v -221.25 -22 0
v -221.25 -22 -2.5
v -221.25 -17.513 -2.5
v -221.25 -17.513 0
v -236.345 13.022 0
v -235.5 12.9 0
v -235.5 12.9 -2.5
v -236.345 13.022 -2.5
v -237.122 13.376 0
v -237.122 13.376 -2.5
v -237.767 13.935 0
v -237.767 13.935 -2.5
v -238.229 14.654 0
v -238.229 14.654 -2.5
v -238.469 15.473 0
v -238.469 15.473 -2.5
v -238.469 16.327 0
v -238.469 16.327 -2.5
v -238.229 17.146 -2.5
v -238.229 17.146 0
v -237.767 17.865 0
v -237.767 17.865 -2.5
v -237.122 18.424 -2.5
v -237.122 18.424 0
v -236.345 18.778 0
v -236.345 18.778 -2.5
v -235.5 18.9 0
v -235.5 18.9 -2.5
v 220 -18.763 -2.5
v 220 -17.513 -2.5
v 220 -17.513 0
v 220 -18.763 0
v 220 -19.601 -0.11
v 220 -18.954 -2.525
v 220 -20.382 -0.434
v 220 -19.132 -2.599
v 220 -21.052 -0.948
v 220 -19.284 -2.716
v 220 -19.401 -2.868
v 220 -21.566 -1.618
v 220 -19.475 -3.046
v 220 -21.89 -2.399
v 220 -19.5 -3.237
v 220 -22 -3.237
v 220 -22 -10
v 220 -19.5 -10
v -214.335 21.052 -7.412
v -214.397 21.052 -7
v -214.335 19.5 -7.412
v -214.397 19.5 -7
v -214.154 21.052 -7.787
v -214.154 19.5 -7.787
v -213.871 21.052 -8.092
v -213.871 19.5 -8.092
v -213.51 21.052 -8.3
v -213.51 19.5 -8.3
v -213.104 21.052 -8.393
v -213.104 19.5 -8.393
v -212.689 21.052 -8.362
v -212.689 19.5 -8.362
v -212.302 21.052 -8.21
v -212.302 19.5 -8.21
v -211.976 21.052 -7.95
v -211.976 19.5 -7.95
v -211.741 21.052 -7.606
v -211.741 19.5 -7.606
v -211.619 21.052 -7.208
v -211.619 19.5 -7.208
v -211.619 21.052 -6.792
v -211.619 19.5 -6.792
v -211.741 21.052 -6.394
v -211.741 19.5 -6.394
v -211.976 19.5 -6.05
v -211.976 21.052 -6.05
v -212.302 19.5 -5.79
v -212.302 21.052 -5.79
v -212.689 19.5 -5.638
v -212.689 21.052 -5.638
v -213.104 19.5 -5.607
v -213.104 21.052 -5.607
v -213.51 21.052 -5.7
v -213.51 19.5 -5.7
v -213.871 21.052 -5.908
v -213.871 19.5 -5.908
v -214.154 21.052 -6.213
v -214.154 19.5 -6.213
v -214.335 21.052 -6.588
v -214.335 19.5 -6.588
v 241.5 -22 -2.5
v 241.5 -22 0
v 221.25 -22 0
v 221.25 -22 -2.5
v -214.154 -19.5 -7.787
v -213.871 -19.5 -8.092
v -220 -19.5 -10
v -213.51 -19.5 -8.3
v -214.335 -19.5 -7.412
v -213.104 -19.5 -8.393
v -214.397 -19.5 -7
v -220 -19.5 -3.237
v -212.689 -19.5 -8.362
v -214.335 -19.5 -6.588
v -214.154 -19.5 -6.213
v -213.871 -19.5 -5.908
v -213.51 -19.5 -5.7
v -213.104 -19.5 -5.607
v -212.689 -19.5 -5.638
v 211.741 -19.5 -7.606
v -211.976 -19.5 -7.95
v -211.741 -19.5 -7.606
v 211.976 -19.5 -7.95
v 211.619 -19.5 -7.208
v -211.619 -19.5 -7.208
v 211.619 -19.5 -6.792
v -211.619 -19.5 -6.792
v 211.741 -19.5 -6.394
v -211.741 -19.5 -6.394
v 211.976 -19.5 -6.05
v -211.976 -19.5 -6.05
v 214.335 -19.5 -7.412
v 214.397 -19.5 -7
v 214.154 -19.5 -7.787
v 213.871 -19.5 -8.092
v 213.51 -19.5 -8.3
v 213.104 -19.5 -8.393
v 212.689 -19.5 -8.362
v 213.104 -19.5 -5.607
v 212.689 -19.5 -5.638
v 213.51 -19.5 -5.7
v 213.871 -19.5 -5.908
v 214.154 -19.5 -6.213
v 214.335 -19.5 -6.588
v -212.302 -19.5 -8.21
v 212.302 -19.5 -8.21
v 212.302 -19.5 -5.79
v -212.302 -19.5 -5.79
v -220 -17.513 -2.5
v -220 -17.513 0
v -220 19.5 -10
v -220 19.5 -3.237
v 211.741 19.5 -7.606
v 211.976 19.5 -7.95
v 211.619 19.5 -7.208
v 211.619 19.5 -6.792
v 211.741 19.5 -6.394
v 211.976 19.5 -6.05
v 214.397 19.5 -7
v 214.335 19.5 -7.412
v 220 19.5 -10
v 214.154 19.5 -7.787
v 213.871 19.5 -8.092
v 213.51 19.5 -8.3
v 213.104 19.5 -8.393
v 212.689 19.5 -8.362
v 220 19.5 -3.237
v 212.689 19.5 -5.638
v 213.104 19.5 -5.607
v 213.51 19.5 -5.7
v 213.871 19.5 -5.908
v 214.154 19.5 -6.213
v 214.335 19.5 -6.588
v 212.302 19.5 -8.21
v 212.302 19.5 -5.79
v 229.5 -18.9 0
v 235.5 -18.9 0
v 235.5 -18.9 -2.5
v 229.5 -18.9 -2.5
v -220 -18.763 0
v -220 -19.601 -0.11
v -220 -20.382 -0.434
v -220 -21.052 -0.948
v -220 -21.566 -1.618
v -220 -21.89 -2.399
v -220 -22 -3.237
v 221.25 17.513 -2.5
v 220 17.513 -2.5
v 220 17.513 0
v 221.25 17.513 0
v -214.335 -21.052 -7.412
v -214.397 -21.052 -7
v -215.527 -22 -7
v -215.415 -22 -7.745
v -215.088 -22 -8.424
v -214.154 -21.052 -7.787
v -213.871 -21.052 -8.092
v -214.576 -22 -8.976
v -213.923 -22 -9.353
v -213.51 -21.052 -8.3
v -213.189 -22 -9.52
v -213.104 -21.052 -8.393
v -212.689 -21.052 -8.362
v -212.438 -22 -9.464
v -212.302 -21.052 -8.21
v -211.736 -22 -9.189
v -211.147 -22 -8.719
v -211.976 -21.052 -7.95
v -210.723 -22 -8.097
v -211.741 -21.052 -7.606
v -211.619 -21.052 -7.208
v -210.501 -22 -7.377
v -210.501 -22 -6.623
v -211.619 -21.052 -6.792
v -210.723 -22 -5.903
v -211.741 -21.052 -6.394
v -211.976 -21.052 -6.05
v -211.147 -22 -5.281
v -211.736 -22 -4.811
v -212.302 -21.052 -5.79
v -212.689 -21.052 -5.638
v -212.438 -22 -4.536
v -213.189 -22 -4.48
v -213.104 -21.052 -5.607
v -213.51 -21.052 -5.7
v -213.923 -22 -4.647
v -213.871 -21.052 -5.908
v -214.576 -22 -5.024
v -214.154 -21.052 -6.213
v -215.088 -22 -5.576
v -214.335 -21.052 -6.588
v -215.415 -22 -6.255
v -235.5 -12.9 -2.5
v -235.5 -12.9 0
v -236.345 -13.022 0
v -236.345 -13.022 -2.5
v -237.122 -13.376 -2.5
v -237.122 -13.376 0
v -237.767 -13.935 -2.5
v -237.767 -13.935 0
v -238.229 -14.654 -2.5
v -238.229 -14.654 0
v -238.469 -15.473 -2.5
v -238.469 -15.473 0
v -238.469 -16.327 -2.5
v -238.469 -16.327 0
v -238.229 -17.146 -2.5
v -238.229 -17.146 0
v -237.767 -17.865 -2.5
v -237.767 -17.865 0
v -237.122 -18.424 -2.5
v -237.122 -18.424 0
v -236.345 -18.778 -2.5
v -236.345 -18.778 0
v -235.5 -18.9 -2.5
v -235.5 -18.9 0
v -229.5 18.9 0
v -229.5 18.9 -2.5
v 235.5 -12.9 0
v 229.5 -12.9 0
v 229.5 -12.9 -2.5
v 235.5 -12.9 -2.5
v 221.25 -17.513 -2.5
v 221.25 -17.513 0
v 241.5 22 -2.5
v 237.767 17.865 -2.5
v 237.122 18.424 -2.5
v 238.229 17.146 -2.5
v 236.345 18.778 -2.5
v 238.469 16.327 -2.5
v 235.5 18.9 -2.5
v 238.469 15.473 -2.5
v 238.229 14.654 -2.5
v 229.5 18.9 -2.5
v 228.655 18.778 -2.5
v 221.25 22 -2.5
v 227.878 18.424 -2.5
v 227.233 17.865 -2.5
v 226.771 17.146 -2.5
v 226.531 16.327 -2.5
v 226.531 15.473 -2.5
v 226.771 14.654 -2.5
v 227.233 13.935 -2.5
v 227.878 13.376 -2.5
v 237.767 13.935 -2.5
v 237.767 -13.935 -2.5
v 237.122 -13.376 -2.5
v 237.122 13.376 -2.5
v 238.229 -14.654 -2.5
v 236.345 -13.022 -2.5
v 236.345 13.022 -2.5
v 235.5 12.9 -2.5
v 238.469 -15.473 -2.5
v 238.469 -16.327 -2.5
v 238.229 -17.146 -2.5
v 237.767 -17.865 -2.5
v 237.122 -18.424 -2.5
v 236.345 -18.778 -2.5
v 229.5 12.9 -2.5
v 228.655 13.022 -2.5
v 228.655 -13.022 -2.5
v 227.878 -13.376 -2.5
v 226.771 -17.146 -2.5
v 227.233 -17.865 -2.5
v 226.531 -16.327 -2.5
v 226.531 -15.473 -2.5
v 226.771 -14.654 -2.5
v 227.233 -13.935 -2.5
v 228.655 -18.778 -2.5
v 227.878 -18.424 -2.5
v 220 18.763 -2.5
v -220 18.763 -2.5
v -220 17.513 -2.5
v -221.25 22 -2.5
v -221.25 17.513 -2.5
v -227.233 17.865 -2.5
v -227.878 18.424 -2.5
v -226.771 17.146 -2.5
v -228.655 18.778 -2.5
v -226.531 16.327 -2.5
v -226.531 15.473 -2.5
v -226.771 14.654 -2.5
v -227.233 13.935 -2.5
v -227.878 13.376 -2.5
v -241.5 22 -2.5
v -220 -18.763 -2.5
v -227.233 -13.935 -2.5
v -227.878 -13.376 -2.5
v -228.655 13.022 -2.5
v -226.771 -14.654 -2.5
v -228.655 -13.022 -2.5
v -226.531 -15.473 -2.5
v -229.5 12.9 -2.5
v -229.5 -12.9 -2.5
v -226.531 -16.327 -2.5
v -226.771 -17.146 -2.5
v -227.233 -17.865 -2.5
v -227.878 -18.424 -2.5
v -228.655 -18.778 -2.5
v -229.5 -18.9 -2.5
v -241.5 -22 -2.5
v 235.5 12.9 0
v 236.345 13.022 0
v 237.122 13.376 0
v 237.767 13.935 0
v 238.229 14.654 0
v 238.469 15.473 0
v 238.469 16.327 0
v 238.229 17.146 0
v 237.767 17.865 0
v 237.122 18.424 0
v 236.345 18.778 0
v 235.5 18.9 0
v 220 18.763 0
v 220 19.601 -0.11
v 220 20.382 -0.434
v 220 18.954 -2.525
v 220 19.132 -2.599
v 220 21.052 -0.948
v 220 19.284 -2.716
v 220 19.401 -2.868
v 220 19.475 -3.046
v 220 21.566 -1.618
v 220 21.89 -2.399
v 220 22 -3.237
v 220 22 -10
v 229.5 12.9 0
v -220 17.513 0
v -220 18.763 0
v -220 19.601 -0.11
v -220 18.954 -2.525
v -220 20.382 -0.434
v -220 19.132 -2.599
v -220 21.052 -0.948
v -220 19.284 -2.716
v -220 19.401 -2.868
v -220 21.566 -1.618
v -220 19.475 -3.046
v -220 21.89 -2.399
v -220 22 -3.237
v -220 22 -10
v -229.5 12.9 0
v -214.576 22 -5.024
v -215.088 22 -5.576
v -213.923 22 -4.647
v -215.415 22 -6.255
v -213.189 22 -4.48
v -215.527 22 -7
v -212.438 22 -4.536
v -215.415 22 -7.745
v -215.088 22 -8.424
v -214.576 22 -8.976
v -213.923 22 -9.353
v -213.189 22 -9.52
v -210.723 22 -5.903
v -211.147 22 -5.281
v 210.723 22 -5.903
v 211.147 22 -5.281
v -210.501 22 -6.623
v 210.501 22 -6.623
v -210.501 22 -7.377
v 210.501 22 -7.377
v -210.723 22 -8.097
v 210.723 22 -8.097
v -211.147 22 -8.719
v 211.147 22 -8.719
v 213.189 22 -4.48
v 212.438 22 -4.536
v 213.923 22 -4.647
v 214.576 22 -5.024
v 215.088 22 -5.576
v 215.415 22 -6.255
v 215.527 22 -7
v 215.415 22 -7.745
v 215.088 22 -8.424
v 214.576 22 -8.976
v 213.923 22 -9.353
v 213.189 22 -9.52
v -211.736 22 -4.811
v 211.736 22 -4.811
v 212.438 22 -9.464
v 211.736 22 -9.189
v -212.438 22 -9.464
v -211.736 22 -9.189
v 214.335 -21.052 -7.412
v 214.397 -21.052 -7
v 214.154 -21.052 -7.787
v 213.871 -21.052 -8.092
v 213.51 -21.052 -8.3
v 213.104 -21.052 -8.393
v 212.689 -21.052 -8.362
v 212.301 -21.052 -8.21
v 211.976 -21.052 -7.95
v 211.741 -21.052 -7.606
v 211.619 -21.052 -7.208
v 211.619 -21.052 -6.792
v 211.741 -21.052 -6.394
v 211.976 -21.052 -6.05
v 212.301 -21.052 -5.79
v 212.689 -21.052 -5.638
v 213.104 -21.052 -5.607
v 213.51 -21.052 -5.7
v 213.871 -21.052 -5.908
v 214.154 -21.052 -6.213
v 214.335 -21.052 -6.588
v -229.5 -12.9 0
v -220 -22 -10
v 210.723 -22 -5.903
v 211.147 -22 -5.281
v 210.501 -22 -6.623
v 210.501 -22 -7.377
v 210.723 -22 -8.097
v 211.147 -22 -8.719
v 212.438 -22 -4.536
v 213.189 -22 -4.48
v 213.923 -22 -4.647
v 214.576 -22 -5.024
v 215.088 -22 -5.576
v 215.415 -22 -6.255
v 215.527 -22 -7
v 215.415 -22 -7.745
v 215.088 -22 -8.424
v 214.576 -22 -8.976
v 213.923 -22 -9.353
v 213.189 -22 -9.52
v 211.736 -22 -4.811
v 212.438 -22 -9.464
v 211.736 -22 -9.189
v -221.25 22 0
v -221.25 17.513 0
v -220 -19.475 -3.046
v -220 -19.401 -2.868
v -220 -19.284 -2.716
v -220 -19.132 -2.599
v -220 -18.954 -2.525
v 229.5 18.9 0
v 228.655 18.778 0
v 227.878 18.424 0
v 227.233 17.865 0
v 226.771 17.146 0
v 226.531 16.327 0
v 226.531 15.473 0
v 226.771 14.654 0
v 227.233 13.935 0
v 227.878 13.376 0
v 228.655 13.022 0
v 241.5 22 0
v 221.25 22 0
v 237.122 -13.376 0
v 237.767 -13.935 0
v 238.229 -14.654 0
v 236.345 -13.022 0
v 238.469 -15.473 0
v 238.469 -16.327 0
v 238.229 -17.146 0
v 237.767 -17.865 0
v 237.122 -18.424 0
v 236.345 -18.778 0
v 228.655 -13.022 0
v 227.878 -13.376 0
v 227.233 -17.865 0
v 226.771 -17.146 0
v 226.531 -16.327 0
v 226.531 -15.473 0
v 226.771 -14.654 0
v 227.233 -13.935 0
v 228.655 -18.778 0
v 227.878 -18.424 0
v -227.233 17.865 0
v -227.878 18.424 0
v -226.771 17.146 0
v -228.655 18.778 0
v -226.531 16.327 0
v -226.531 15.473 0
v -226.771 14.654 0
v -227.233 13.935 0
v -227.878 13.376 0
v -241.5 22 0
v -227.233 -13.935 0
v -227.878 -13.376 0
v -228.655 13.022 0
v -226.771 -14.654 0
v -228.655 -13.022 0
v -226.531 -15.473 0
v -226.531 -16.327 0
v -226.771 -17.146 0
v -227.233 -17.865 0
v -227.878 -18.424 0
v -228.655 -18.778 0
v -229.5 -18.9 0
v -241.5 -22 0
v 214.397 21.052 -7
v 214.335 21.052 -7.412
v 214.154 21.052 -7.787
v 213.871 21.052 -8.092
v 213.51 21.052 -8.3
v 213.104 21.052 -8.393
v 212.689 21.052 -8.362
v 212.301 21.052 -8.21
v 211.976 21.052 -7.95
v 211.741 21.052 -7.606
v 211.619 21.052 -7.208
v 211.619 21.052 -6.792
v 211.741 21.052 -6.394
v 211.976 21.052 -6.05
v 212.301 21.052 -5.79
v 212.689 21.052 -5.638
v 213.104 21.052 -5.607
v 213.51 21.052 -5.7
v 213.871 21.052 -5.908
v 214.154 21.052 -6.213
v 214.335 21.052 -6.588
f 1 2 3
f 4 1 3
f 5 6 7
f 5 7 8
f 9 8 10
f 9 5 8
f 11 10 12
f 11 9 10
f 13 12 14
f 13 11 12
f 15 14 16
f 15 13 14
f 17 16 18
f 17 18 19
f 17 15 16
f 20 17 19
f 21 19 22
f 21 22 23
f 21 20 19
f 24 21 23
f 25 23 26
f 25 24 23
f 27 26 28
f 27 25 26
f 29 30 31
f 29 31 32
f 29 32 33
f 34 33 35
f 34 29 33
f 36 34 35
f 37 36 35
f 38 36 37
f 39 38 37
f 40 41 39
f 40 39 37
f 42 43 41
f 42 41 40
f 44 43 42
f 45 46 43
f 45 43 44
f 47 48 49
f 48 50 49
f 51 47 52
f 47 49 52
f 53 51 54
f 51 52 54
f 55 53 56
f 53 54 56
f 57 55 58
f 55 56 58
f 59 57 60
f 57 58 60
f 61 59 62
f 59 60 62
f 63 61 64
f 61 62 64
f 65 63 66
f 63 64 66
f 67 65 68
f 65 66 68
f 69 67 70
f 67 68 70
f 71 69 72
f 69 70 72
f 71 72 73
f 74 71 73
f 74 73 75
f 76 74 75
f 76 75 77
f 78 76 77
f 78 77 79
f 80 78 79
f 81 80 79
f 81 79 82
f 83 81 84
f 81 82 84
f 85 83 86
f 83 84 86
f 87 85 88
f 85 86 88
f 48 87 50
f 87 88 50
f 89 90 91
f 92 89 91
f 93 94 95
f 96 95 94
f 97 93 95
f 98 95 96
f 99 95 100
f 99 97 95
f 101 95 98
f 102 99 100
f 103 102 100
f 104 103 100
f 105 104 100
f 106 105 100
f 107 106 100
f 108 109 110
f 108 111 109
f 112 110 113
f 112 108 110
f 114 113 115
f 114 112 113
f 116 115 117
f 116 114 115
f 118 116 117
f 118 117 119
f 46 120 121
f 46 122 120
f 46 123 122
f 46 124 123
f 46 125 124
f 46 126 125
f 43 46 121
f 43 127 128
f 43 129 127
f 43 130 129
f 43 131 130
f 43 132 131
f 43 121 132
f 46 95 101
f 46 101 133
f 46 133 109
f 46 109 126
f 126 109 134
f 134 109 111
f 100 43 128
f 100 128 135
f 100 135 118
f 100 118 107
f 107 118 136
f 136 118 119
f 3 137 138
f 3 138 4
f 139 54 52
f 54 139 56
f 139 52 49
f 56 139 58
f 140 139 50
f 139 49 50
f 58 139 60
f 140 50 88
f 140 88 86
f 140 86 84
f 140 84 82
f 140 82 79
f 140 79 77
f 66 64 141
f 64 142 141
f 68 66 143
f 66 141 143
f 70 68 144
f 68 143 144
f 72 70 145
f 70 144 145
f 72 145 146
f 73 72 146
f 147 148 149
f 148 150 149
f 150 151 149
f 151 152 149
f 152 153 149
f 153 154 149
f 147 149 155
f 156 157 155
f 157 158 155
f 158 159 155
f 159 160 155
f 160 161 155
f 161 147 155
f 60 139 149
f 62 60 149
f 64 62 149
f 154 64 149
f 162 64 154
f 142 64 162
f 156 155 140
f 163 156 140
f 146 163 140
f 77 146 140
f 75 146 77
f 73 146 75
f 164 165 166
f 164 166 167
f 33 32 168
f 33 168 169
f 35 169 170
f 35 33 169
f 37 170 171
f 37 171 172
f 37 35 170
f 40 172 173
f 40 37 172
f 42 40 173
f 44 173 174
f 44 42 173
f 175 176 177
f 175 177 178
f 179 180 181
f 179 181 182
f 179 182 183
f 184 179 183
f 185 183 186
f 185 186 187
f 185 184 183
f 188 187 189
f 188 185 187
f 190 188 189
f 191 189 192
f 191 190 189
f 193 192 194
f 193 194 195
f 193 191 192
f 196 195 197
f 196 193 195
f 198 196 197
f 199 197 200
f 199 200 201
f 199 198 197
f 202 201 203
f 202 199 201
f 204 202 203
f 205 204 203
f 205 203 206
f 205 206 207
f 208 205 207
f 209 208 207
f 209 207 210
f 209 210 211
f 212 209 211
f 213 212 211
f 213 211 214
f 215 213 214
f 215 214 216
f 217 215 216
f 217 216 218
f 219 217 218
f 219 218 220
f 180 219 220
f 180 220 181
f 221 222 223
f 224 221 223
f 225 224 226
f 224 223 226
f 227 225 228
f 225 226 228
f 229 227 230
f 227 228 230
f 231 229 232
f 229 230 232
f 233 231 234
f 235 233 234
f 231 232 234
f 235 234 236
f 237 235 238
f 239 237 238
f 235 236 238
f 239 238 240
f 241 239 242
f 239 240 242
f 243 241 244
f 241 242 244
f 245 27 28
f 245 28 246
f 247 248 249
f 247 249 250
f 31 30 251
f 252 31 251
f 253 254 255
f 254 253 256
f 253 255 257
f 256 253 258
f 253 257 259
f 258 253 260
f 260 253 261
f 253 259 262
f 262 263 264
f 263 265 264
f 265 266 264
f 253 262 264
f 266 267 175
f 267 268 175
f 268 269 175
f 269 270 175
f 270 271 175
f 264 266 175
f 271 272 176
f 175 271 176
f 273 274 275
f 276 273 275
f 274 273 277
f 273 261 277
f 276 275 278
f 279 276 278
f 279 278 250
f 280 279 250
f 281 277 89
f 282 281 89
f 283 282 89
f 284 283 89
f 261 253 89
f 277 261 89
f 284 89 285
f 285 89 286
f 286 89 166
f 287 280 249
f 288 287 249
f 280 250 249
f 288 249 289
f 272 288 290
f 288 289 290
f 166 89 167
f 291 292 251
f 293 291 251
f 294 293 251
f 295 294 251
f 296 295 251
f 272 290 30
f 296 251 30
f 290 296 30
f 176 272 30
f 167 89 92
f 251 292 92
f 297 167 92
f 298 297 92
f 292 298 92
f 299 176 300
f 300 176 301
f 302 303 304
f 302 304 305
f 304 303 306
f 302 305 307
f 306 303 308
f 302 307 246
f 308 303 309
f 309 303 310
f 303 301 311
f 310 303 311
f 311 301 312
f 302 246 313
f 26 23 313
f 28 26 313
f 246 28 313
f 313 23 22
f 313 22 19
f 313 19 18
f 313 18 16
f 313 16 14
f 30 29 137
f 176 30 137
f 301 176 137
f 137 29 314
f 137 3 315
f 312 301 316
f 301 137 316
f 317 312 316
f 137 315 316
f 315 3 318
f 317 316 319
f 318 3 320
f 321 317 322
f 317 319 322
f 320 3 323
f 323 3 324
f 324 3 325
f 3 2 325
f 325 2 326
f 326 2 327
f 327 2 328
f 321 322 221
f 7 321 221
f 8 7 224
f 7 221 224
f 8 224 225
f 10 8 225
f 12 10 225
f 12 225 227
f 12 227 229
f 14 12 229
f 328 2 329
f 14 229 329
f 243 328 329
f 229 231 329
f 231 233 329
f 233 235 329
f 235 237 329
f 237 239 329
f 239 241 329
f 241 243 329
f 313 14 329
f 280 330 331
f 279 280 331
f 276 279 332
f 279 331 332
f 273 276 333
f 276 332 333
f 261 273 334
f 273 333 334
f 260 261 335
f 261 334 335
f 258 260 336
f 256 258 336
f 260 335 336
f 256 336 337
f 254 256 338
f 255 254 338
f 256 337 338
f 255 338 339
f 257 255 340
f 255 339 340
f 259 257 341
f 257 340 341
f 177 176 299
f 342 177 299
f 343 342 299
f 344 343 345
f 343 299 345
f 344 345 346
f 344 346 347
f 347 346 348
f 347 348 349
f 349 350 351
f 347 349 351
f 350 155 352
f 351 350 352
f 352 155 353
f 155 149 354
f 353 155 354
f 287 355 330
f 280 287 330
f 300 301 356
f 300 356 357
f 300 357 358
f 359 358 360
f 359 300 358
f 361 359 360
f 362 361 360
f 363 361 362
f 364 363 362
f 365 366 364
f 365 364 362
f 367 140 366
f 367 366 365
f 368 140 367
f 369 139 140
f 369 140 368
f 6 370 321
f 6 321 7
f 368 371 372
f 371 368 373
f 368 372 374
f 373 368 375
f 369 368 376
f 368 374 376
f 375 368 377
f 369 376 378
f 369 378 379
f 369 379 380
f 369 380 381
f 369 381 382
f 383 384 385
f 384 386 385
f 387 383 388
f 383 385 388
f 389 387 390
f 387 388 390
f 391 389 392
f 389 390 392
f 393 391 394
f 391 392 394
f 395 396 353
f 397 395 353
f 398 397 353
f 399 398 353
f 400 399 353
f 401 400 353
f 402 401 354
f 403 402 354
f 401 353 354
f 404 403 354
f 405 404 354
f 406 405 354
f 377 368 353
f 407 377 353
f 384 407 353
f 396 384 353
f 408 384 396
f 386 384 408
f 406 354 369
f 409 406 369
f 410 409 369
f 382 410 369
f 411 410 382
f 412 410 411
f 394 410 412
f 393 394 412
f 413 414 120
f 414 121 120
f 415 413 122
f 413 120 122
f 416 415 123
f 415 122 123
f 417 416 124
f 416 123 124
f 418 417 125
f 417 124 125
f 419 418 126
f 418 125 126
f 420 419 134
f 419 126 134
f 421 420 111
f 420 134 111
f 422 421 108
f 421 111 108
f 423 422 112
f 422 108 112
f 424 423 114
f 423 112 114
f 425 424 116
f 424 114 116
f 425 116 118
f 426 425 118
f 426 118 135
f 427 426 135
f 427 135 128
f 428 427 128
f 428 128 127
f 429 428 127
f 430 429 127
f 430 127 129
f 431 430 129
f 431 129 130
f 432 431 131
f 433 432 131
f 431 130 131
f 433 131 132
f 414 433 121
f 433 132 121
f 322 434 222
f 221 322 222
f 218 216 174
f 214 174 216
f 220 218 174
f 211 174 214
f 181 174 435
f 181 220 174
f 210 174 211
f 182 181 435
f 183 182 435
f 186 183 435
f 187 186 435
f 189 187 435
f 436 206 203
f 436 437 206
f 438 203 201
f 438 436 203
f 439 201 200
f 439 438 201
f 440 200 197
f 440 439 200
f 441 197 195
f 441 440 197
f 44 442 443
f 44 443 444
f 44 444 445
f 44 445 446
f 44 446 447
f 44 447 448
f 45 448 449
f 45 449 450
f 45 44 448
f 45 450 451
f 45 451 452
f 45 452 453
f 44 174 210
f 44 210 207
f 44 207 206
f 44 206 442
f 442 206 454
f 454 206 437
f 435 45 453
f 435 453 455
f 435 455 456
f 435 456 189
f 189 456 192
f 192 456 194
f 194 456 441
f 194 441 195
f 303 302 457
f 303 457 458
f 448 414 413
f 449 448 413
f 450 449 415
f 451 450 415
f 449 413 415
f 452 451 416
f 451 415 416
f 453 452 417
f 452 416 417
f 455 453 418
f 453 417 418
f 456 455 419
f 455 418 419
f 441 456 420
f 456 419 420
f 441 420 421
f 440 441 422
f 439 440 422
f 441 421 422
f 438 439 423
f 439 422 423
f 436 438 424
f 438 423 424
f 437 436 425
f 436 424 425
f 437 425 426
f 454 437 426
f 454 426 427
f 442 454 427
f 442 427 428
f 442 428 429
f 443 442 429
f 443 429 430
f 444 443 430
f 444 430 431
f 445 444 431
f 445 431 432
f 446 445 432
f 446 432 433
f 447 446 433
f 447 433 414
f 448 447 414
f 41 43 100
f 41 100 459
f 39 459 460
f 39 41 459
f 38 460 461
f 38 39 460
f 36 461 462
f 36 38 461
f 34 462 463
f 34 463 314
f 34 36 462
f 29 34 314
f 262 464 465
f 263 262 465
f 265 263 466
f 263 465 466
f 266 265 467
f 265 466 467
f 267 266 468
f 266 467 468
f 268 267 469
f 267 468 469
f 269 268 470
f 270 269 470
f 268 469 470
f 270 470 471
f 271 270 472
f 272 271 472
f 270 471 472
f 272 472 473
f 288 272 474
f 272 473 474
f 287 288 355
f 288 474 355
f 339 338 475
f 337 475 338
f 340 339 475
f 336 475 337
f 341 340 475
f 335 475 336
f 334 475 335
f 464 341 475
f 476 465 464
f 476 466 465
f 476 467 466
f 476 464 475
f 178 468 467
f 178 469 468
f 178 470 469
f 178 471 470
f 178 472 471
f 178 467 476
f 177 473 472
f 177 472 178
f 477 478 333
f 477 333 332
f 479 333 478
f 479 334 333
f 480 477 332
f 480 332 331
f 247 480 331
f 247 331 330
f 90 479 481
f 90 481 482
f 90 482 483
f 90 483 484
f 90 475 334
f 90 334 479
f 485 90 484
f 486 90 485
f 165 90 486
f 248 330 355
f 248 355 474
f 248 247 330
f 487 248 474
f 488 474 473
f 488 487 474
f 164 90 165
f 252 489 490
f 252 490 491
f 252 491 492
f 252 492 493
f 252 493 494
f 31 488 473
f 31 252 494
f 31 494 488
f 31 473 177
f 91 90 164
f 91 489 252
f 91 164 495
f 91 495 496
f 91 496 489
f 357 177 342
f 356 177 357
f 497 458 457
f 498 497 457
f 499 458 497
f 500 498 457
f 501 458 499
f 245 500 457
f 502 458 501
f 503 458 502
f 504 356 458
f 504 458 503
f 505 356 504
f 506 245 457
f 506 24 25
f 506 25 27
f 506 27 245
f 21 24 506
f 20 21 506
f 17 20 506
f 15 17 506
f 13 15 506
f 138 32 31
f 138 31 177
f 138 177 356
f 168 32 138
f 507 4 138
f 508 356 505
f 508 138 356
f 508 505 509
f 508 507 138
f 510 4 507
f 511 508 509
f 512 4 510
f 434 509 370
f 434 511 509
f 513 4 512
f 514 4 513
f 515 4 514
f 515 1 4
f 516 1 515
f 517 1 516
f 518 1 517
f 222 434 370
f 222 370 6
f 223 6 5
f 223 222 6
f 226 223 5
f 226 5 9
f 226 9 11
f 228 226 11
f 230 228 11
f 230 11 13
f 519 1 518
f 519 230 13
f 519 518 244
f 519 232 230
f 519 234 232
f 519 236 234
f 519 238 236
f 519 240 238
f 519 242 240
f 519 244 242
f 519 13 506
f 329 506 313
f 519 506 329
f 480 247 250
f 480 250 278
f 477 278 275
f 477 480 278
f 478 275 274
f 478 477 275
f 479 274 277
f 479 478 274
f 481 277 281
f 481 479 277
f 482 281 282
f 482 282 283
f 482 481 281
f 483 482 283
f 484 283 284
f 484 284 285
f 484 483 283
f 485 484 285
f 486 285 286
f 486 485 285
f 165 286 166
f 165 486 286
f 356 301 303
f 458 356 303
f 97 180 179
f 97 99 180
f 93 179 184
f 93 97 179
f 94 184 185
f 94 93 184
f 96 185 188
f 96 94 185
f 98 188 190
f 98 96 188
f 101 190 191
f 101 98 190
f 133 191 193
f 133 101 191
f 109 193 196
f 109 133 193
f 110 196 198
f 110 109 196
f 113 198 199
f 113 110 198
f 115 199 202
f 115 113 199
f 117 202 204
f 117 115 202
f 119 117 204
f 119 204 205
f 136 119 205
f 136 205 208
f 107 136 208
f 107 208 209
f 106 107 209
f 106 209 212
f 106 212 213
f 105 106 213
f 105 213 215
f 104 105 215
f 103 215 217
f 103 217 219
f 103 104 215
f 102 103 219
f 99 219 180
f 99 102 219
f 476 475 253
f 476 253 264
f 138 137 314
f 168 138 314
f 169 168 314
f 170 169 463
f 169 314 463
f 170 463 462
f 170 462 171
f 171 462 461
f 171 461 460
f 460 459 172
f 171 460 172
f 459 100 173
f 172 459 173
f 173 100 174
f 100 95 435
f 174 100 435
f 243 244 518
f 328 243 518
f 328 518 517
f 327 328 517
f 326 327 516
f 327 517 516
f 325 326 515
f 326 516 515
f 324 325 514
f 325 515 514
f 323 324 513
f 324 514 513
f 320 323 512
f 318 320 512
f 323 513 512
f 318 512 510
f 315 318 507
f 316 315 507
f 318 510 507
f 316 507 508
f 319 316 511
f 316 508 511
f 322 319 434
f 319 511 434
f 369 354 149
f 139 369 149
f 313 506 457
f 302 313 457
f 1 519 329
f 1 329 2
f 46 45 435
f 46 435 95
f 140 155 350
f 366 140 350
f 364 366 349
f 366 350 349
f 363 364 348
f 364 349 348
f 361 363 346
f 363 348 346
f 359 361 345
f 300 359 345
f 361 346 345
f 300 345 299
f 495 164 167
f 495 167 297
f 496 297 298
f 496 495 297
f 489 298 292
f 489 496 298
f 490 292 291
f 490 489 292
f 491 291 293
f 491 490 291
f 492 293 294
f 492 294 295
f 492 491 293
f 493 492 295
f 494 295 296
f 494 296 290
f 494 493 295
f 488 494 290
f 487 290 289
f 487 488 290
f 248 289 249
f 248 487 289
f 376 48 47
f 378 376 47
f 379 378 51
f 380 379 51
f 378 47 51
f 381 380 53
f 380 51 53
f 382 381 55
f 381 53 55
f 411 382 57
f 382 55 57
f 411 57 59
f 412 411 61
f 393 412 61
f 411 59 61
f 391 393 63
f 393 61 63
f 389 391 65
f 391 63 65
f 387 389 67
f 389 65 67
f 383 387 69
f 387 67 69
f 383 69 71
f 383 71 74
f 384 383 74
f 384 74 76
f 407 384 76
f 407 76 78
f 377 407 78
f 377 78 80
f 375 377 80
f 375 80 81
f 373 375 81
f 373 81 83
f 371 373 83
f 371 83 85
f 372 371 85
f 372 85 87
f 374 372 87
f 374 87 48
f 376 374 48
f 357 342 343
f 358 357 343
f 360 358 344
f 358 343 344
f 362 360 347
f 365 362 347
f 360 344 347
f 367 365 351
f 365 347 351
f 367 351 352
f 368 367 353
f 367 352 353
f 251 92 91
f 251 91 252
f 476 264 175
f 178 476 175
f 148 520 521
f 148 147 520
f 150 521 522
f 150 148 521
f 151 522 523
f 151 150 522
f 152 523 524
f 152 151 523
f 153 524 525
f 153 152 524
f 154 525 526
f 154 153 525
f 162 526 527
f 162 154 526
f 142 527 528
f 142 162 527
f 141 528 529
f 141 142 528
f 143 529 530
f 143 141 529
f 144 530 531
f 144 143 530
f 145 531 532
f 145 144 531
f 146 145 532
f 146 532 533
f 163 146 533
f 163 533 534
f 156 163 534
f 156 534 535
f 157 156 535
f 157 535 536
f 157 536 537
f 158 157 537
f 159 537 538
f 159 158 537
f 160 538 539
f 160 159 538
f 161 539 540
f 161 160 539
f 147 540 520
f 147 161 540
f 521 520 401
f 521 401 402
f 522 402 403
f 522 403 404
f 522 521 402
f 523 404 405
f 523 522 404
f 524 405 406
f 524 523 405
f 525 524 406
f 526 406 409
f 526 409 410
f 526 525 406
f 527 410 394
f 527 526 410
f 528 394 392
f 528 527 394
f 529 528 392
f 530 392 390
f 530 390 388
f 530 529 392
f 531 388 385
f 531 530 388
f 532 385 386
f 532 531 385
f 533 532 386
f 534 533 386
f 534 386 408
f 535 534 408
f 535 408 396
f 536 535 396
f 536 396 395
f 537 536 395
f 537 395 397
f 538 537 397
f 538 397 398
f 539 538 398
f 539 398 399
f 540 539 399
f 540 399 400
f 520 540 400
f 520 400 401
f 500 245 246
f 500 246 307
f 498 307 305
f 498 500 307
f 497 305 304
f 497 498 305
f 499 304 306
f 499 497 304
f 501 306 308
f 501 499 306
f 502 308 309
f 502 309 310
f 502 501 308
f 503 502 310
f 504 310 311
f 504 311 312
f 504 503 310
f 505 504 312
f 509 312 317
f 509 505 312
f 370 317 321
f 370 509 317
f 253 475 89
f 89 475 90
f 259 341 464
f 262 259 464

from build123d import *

# Parameters (mm, degrees)
SKETCH1_W                                         = 241.5
SKETCH1_H                                         = 22
BASE_FLANGE1_DEPTH                                = 2.5
EDGE_FLANGE1_STRIP_W                              = 11.4732
EDGE_FLANGE1_STRIP_H                              = 2.5
EDGE_FLANGE1_STRIP_CUT_DEPTH                      = 220
EDGE_FLANGE1_RELIEF_W                             = 12.7232
EDGE_FLANGE1_RELIEF_H                             = 1.25
EDGE_FLANGE1_RELIEF_CUT_DEPTH                     = 2.5
EDGE_FLANGE1_DEPTH                                = 220
CUT_EXTRUDE1_DEPTH                                = 2.5
CSK_FOR_3_FLAT_HEAD_MACHINE_SCREW_100_D           = 2.794
CSK_FOR_3_FLAT_HEAD_MACHINE_SCREW_100_CSINK_D     = 5.0546
CSK_FOR_3_FLAT_HEAD_MACHINE_SCREW_100_CSINK_ANGLE = 100


# Sheet-metal steps are written as plain solids
with BuildPart() as part:
    # Sketch1 → Base-Flange1 (new body)
    with BuildSketch(Plane.XY):
        with Locations((-120.75, 11)):
            Rectangle(SKETCH1_W, SKETCH1_H)
    extrude(amount=-BASE_FLANGE1_DEPTH)

    # Edge-Flange1 strip (across the edge) → Edge-Flange1 strip cut (cut)
    with BuildSketch(Plane(origin=(-220, 22, -2.5), x_dir=(0, -1, 0), z_dir=(1, 0, 0))):
        with Locations((-2.5, -1.25)):
            Rectangle(EDGE_FLANGE1_STRIP_W, EDGE_FLANGE1_STRIP_H)
    extrude(amount=EDGE_FLANGE1_STRIP_CUT_DEPTH, mode=Mode.SUBTRACT)

    # Edge-Flange1 relief (on the sheet) → Edge-Flange1 relief cut (cut)
    with BuildSketch(Plane(origin=(-220, 18.7634, -2.5), x_dir=(0, -1, 0), z_dir=(0, 0, -1))):
        with Locations((-5.1116, 0.625)):
            Rectangle(EDGE_FLANGE1_RELIEF_W, EDGE_FLANGE1_RELIEF_H)
    extrude(amount=-EDGE_FLANGE1_RELIEF_CUT_DEPTH, mode=Mode.SUBTRACT)

    # Edge-Flange1 section (across the edge) → Edge-Flange1 (add)
    with BuildSketch(Plane(origin=(-220, 22, -2.5), x_dir=(0, -1, 0), z_dir=(1, 0, 0))):
        with BuildLine():
            Line((0, 0.7366), (0, 7.5))
            Line((0, 7.5), (2.5, 7.5))
            Line((2.5, 7.5), (2.5, 0.7366))
            ThreePointArc((2.5, 0.7366), (2.715745145, 0.215745145), (3.2366, 0))
            Line((3.2366, 0), (3.2366, -2.5))
            ThreePointArc((3.2366, -2.5), (0.947978192, -1.552021808), (0, 0.7366))
        make_face()
    extrude(amount=EDGE_FLANGE1_DEPTH)

    # Sketch13 → Cut-Extrude1 (cut)
    with BuildSketch(Plane.XY):
        with BuildLine():
            Line((-235.5, 18.9), (-229.5, 18.9))
            ThreePointArc((-229.5, 18.9), (-226.5, 15.9), (-229.5, 12.9))
            Line((-229.5, 12.9), (-235.5, 12.9))
            ThreePointArc((-235.5, 12.9), (-238.5, 15.9), (-235.5, 18.9))
        make_face()
    extrude(amount=-CUT_EXTRUDE1_DEPTH, mode=Mode.SUBTRACT)

    # CSK for #3 Flat Head Machine Screw (100)1 (through all)
    with Locations(Plane(origin=(0, 22, 0), x_dir=(1, 0, 0), z_dir=(0, 1, 0))):
        with Locations((-213, 7)):
            CounterSinkHole(CSK_FOR_3_FLAT_HEAD_MACHINE_SCREW_100_D / 2, CSK_FOR_3_FLAT_HEAD_MACHINE_SCREW_100_CSINK_D / 2, counter_sink_angle=CSK_FOR_3_FLAT_HEAD_MACHINE_SCREW_100_CSINK_ANGLE)

    # Mirror1: part across plane


with BuildPart() as part_1:
    add(part.part)
    add(part.part.mirror(Plane(origin=(0, 0, -2.5), x_dir=(0, 0, 1), z_dir=(1, 0, 0))))

    # Mirror2: part across face


with BuildPart() as part_2:
    add(part_1.part)
    add(part_1.part.mirror(Plane(origin=(0, 0, -1.25), x_dir=(0, 0, 1), z_dir=(0, -1, 0))))


solid = part_2.part
